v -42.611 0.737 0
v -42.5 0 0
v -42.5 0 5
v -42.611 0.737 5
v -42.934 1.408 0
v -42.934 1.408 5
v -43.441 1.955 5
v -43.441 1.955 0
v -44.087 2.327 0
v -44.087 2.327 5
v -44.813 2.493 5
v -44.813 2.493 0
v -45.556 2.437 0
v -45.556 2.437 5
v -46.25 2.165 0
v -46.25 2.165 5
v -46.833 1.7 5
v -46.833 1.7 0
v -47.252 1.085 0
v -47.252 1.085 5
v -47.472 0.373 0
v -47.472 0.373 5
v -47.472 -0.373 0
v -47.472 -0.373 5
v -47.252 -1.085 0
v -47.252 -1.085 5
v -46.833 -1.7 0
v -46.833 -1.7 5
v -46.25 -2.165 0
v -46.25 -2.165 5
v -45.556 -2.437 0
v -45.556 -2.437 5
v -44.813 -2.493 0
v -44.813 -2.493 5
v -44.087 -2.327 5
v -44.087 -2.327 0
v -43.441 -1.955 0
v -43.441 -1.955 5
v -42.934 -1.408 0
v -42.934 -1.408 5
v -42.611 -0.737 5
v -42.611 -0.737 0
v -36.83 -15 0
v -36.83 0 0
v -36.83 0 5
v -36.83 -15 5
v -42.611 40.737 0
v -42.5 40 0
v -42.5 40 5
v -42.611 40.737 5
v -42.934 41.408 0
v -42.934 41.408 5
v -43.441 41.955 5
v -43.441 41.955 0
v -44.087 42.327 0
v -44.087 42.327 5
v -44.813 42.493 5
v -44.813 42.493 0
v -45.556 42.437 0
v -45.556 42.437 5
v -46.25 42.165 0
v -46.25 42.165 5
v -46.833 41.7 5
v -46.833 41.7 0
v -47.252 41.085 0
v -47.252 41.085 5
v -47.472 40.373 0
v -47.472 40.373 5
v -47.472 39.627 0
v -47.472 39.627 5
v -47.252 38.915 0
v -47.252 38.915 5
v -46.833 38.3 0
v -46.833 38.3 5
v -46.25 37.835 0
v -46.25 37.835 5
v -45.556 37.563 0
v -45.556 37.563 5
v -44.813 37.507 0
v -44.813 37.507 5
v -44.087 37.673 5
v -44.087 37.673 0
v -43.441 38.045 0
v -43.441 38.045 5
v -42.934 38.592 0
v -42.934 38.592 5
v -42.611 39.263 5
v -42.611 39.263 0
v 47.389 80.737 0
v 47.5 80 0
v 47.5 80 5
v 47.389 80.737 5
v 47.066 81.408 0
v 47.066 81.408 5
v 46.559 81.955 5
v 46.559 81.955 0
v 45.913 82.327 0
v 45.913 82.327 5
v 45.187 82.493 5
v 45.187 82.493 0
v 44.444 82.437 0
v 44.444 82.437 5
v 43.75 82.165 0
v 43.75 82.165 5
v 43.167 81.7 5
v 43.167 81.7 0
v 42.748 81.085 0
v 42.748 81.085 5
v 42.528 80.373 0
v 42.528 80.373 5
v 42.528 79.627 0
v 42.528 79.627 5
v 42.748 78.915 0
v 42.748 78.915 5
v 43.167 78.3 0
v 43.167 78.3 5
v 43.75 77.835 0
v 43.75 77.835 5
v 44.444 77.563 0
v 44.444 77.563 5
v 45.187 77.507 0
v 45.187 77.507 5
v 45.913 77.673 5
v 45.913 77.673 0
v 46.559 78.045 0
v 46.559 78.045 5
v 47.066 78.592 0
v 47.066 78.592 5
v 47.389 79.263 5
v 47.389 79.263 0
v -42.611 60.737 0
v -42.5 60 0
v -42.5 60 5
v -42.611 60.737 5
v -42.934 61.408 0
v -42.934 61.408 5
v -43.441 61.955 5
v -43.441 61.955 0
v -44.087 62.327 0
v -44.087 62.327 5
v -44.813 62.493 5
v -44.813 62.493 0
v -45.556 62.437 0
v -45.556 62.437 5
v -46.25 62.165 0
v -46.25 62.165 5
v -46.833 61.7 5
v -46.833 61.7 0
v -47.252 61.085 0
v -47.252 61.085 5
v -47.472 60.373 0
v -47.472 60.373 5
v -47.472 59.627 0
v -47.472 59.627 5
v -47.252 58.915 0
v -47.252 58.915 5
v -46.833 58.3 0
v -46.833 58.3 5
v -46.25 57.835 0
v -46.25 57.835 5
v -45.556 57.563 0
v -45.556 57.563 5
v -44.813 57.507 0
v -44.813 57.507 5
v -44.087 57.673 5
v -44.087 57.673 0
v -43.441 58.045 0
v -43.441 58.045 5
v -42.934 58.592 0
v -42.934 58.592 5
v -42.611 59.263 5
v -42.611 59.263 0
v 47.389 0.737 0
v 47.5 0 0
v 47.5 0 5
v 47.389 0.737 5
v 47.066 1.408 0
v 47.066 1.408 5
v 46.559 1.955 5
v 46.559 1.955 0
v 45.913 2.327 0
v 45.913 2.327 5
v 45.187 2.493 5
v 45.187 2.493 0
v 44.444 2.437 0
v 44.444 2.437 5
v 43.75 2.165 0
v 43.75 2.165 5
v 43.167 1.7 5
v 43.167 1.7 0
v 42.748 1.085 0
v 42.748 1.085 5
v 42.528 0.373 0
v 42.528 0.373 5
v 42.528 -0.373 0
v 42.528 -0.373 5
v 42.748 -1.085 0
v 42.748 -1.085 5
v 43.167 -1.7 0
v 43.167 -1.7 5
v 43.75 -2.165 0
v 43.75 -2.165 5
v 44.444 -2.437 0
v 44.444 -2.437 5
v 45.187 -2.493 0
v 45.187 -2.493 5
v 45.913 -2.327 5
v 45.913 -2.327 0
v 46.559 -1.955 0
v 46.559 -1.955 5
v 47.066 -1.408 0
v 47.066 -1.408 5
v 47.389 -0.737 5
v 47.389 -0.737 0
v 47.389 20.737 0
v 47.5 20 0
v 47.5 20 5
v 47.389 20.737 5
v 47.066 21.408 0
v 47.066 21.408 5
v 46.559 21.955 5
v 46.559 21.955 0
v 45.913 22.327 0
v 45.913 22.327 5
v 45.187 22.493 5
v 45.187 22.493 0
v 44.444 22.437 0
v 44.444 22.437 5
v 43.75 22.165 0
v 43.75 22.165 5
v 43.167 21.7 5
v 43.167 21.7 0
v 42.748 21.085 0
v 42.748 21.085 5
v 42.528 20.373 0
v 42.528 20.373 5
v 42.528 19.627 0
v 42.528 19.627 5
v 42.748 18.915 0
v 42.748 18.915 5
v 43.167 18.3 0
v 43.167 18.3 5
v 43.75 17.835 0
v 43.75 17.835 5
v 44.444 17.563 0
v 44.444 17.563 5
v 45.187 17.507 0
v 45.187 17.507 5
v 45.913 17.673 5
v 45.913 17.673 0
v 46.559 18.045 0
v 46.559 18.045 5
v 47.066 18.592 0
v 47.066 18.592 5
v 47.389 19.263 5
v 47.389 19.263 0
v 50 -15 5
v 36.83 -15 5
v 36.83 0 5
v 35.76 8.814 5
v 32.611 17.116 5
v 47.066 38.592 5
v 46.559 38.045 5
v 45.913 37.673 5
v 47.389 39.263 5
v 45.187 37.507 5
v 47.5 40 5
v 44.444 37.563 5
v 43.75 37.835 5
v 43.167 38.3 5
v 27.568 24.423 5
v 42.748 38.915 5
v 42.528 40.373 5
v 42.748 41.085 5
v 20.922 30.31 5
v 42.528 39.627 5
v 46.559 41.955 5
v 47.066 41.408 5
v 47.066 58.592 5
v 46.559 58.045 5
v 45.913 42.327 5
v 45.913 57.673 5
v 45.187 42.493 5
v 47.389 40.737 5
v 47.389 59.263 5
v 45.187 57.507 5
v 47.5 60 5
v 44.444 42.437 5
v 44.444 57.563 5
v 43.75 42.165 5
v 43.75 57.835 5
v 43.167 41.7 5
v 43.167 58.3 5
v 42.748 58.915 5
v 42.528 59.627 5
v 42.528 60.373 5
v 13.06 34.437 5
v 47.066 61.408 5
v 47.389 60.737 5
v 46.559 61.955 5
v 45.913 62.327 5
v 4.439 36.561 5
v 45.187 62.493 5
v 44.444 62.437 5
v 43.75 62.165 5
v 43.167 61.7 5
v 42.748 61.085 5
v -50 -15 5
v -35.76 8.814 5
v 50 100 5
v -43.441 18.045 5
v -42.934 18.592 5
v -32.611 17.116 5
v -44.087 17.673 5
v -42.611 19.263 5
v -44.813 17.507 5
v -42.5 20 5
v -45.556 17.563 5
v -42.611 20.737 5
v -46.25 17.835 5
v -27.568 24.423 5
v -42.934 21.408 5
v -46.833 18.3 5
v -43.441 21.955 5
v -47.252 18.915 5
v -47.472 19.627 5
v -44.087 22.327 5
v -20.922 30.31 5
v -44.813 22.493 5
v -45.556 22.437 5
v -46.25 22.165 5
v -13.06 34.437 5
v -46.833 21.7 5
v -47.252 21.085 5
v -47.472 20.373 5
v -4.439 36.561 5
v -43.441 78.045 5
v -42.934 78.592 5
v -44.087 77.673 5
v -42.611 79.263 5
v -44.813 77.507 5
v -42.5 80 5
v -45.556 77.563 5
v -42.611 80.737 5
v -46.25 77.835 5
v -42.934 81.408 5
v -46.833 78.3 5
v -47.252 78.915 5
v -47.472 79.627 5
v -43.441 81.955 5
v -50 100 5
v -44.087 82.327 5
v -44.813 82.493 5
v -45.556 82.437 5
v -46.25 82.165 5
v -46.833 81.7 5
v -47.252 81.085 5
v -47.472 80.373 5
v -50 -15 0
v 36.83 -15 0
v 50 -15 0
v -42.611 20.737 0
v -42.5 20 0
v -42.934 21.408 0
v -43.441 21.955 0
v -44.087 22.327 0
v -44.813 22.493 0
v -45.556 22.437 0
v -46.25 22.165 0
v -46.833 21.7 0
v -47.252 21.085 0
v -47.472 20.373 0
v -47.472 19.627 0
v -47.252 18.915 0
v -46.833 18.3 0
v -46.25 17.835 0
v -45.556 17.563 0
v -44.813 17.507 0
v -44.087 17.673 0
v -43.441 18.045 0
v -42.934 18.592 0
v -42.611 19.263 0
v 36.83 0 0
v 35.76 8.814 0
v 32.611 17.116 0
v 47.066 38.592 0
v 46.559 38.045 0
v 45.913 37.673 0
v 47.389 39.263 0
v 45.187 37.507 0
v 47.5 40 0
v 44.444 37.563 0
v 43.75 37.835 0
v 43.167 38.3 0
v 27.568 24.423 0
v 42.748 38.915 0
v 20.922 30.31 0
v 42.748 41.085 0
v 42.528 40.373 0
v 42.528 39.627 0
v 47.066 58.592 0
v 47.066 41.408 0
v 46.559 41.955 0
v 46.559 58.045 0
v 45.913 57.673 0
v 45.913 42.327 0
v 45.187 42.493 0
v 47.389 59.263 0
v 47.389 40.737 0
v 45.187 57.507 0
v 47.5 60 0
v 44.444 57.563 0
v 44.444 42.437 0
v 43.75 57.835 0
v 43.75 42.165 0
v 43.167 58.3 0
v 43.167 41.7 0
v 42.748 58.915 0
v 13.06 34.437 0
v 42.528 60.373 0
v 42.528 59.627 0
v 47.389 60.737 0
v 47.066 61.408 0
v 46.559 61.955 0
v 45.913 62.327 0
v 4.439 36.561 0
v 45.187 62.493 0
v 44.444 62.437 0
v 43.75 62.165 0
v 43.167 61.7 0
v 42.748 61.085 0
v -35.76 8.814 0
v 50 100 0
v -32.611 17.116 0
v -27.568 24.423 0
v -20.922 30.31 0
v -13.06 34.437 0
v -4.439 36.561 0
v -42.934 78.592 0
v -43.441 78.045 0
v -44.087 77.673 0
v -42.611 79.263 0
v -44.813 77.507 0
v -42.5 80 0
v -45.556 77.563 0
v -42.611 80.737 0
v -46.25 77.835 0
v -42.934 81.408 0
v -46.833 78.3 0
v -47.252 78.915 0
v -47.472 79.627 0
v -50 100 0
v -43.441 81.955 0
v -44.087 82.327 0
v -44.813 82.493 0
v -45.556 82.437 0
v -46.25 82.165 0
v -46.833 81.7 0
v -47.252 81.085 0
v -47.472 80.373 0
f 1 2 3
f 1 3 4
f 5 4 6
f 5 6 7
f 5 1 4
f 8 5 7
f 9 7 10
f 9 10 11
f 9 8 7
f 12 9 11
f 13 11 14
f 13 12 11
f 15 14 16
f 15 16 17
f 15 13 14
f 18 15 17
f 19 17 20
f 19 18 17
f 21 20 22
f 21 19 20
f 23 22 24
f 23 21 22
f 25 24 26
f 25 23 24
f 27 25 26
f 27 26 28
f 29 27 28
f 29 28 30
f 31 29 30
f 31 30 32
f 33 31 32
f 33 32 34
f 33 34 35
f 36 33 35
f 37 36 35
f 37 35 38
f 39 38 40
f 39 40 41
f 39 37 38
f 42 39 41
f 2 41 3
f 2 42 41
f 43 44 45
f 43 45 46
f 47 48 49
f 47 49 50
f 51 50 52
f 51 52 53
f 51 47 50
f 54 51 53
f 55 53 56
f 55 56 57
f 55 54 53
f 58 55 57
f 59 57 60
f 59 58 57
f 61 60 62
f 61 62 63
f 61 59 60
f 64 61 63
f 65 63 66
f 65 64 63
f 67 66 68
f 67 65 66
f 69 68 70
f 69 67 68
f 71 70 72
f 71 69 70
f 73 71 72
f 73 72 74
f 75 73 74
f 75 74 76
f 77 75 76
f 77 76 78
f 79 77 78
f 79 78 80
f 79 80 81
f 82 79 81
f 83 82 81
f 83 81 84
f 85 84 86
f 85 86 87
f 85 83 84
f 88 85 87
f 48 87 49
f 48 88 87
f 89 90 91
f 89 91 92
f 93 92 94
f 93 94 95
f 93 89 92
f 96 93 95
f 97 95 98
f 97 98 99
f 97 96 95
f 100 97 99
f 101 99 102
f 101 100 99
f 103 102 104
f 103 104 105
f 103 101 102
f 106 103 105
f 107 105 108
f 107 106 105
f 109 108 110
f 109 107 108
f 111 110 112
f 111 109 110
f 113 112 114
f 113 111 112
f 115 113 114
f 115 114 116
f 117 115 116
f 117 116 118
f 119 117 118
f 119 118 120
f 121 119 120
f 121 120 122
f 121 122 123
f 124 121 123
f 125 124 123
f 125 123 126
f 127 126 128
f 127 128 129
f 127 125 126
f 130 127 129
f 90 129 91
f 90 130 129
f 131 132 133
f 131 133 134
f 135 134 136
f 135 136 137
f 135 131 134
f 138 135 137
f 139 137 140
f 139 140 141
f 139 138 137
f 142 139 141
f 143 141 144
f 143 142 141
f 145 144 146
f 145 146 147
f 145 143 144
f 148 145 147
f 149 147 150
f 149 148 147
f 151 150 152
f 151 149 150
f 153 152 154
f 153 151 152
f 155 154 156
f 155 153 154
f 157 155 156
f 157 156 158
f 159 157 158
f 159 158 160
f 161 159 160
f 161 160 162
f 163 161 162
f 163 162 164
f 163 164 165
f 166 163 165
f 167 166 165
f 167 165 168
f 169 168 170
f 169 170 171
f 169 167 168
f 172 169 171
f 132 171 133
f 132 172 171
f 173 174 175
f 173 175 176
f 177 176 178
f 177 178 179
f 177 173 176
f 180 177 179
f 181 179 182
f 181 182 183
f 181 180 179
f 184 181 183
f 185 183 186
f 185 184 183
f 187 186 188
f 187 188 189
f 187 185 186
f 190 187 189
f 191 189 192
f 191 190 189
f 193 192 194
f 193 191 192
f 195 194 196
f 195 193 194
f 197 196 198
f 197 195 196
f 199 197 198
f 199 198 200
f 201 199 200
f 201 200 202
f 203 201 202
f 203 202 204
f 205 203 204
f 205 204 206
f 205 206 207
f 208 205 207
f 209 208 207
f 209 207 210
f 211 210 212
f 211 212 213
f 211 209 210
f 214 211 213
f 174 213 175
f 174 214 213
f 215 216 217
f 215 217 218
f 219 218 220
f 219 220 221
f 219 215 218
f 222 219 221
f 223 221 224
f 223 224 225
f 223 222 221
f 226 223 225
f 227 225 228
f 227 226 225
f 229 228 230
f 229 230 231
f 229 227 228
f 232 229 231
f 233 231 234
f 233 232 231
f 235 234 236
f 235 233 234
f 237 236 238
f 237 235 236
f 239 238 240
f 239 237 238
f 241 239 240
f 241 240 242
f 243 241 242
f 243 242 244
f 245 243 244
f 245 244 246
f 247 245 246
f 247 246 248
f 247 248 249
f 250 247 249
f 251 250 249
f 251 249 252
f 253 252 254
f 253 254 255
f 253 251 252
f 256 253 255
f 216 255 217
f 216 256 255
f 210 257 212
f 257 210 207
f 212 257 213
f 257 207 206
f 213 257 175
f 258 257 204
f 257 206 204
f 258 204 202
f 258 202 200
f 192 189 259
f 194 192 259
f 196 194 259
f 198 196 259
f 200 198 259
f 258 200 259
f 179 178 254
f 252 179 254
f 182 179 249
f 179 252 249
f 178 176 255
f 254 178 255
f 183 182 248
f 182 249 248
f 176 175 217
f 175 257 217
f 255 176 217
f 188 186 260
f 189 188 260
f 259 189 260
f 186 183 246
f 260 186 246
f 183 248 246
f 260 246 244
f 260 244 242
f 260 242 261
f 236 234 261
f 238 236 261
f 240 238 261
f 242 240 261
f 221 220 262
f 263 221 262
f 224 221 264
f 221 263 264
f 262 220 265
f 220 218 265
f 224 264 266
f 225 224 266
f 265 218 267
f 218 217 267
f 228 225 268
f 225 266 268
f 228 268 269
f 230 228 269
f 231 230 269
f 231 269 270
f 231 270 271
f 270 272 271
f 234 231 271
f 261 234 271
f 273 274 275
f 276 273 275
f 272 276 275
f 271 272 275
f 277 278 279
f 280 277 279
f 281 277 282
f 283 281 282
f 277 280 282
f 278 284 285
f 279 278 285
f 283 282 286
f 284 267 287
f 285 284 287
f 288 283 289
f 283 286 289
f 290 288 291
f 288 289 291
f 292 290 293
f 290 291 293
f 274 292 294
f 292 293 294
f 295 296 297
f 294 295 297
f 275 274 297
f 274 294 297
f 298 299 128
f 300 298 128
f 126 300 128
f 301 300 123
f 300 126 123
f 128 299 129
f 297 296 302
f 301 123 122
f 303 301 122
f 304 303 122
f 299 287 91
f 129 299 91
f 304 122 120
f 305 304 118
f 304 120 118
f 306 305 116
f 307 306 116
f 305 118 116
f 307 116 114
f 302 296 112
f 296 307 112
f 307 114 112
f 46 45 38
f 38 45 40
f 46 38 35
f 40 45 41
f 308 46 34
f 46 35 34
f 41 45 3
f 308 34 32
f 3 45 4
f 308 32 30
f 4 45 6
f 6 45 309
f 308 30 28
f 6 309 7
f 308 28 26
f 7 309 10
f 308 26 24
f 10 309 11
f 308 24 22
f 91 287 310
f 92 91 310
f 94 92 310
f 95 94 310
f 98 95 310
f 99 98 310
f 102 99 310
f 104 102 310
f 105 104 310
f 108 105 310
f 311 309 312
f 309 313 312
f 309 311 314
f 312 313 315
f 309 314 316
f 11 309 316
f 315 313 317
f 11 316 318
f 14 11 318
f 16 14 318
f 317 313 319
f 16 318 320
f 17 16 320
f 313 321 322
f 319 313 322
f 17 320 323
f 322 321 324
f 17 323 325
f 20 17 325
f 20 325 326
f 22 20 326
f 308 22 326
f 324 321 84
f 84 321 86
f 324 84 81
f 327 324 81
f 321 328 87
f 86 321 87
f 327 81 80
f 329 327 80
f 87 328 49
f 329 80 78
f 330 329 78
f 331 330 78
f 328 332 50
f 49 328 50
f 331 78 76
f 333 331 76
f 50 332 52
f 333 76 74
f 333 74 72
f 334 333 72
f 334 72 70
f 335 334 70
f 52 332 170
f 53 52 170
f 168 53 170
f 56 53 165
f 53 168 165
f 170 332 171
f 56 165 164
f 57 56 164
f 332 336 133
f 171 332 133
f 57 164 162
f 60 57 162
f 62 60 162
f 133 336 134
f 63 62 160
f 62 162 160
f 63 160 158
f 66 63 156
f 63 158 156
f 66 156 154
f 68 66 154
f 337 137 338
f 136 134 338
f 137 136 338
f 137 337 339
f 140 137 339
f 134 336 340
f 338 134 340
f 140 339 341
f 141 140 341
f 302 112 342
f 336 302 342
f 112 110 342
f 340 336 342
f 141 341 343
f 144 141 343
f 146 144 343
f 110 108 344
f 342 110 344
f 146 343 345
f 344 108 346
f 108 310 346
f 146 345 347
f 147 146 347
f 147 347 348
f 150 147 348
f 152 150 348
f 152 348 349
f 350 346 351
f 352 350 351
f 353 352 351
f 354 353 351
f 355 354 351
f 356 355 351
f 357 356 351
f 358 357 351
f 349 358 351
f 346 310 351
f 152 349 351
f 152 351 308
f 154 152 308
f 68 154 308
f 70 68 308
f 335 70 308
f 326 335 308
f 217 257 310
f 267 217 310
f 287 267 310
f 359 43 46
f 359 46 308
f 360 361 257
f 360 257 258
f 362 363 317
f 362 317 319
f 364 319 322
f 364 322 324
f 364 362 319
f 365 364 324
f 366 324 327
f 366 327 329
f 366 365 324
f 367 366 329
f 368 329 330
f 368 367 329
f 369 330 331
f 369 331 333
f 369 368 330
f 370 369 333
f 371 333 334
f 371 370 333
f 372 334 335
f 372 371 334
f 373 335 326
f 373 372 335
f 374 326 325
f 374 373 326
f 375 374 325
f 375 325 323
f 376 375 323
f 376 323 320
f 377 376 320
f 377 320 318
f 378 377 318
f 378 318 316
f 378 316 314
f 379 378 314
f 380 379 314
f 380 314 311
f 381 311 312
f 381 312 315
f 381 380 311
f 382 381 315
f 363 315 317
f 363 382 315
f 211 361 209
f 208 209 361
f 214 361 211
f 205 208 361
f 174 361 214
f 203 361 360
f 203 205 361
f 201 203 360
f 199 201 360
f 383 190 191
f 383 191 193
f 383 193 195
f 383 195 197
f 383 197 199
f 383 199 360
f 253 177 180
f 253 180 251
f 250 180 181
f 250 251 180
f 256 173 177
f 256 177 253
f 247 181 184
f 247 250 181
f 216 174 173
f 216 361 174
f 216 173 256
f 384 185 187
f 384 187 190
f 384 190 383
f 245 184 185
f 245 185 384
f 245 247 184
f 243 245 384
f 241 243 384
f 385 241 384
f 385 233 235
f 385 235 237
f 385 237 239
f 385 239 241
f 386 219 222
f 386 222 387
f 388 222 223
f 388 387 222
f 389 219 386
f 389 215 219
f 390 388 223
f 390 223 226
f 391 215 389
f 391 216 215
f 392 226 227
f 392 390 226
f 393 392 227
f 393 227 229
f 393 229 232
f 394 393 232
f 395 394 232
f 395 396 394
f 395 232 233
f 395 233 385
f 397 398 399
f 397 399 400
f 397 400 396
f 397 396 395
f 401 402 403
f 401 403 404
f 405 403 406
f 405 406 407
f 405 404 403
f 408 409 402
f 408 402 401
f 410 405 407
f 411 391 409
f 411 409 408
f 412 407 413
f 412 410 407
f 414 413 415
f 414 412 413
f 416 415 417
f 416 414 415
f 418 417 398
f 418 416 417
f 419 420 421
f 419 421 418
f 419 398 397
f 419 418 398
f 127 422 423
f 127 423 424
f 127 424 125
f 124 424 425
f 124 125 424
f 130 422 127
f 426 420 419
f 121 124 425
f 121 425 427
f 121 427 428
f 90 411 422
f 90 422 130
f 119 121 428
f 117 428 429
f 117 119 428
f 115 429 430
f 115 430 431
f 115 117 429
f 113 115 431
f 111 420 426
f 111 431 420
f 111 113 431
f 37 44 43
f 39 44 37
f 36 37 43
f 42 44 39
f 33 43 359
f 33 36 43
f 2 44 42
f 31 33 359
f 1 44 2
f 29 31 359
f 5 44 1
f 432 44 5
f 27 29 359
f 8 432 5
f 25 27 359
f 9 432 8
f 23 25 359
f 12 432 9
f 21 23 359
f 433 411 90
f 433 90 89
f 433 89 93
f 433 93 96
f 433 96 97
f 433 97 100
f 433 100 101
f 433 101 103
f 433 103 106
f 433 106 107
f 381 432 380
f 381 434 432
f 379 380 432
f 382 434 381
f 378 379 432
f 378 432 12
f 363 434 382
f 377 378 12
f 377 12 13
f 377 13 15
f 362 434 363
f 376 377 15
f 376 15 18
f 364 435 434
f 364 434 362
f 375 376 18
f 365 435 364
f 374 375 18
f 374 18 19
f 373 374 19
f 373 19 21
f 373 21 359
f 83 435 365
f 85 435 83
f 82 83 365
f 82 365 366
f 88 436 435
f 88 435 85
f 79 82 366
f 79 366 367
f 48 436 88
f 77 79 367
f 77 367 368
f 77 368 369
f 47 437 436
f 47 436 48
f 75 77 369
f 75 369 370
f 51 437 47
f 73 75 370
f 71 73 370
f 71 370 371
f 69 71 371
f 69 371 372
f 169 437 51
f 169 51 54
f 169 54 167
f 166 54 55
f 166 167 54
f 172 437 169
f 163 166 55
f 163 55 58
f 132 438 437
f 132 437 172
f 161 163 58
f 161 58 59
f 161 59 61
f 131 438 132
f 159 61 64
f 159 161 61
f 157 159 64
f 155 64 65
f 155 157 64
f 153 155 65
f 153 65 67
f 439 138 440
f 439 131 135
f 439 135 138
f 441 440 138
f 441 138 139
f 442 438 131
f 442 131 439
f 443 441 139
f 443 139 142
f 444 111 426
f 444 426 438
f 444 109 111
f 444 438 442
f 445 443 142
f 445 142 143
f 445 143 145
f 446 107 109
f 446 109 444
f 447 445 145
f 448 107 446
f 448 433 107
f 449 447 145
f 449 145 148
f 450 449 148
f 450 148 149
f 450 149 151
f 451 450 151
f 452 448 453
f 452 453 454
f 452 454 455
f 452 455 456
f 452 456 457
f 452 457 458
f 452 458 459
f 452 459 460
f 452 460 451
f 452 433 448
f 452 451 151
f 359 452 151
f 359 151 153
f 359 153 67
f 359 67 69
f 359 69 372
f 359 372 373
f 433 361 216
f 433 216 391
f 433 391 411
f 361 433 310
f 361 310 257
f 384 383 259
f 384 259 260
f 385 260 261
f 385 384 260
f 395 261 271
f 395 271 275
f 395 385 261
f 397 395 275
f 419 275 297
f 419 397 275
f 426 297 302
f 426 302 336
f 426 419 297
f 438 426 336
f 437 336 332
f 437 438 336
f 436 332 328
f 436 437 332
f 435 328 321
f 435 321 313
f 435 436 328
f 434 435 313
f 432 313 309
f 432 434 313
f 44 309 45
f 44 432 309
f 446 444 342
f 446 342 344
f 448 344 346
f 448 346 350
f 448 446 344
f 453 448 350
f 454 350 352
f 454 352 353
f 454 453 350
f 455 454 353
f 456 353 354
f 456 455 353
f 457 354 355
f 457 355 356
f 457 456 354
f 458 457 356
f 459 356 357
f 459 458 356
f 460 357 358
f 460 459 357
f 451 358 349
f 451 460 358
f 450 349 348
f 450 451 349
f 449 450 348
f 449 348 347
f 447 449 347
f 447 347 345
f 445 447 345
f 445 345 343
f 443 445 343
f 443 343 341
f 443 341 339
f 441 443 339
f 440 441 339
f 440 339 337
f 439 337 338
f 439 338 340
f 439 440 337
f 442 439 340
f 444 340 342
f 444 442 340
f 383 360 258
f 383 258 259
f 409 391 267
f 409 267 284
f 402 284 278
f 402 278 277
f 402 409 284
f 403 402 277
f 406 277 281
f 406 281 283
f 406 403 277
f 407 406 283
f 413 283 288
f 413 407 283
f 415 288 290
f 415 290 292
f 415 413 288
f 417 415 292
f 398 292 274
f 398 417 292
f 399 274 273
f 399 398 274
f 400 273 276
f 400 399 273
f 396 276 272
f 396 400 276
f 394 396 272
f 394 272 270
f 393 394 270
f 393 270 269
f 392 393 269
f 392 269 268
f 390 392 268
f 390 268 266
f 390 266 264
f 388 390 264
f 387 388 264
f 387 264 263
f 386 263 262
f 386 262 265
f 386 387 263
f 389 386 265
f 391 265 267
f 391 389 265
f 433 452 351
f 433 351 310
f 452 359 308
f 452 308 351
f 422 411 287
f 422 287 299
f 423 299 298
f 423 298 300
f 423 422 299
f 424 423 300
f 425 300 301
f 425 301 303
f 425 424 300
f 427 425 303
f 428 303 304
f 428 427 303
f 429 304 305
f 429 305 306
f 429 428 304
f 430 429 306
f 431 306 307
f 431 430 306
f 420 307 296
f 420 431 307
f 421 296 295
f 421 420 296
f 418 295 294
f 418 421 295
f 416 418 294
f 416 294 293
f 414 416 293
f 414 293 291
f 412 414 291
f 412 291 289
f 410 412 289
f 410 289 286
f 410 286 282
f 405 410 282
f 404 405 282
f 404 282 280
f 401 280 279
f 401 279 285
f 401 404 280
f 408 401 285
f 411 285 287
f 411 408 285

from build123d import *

# Parameters (mm, degrees)
SKETCH1_R           = 2.5
BOSS_EXTRUDE1_DEPTH = 5


with BuildPart() as part:
    # Sketch1 → Boss-Extrude1 (new body)
    with BuildSketch(Plane.XY):
        with BuildLine():
            Line((-50, -15), (-50, 100))
            Line((-50, 100), (50, 100))
            Line((50, 100), (50, -15))
            Line((50, -15), (36.83, -15))
            Line((36.83, -15), (36.83, 0))
            ThreePointArc((36.83, 0), (0, 36.83), (-36.83, 0))
            Line((-36.83, 0), (-36.83, -15))
            Line((-36.83, -15), (-50, -15))
        make_face()
        with Locations((-45, 0)):
            Circle(SKETCH1_R, mode=Mode.SUBTRACT)
        with Locations((45, 0)):
            Circle(SKETCH1_R, mode=Mode.SUBTRACT)
        with Locations((45, 20)):
            Circle(SKETCH1_R, mode=Mode.SUBTRACT)
        with Locations((45, 40)):
            Circle(SKETCH1_R, mode=Mode.SUBTRACT)
        with Locations((45, 60)):
            Circle(SKETCH1_R, mode=Mode.SUBTRACT)
        with Locations((45, 80)):
            Circle(SKETCH1_R, mode=Mode.SUBTRACT)
        with Locations((-45, 20)):
            Circle(SKETCH1_R, mode=Mode.SUBTRACT)
        with Locations((-45, 40)):
            Circle(SKETCH1_R, mode=Mode.SUBTRACT)
        with Locations((-45, 60)):
            Circle(SKETCH1_R, mode=Mode.SUBTRACT)
        with Locations((-45, 80)):
            Circle(SKETCH1_R, mode=Mode.SUBTRACT)
    extrude(amount=BOSS_EXTRUDE1_DEPTH)


solid = part.part
